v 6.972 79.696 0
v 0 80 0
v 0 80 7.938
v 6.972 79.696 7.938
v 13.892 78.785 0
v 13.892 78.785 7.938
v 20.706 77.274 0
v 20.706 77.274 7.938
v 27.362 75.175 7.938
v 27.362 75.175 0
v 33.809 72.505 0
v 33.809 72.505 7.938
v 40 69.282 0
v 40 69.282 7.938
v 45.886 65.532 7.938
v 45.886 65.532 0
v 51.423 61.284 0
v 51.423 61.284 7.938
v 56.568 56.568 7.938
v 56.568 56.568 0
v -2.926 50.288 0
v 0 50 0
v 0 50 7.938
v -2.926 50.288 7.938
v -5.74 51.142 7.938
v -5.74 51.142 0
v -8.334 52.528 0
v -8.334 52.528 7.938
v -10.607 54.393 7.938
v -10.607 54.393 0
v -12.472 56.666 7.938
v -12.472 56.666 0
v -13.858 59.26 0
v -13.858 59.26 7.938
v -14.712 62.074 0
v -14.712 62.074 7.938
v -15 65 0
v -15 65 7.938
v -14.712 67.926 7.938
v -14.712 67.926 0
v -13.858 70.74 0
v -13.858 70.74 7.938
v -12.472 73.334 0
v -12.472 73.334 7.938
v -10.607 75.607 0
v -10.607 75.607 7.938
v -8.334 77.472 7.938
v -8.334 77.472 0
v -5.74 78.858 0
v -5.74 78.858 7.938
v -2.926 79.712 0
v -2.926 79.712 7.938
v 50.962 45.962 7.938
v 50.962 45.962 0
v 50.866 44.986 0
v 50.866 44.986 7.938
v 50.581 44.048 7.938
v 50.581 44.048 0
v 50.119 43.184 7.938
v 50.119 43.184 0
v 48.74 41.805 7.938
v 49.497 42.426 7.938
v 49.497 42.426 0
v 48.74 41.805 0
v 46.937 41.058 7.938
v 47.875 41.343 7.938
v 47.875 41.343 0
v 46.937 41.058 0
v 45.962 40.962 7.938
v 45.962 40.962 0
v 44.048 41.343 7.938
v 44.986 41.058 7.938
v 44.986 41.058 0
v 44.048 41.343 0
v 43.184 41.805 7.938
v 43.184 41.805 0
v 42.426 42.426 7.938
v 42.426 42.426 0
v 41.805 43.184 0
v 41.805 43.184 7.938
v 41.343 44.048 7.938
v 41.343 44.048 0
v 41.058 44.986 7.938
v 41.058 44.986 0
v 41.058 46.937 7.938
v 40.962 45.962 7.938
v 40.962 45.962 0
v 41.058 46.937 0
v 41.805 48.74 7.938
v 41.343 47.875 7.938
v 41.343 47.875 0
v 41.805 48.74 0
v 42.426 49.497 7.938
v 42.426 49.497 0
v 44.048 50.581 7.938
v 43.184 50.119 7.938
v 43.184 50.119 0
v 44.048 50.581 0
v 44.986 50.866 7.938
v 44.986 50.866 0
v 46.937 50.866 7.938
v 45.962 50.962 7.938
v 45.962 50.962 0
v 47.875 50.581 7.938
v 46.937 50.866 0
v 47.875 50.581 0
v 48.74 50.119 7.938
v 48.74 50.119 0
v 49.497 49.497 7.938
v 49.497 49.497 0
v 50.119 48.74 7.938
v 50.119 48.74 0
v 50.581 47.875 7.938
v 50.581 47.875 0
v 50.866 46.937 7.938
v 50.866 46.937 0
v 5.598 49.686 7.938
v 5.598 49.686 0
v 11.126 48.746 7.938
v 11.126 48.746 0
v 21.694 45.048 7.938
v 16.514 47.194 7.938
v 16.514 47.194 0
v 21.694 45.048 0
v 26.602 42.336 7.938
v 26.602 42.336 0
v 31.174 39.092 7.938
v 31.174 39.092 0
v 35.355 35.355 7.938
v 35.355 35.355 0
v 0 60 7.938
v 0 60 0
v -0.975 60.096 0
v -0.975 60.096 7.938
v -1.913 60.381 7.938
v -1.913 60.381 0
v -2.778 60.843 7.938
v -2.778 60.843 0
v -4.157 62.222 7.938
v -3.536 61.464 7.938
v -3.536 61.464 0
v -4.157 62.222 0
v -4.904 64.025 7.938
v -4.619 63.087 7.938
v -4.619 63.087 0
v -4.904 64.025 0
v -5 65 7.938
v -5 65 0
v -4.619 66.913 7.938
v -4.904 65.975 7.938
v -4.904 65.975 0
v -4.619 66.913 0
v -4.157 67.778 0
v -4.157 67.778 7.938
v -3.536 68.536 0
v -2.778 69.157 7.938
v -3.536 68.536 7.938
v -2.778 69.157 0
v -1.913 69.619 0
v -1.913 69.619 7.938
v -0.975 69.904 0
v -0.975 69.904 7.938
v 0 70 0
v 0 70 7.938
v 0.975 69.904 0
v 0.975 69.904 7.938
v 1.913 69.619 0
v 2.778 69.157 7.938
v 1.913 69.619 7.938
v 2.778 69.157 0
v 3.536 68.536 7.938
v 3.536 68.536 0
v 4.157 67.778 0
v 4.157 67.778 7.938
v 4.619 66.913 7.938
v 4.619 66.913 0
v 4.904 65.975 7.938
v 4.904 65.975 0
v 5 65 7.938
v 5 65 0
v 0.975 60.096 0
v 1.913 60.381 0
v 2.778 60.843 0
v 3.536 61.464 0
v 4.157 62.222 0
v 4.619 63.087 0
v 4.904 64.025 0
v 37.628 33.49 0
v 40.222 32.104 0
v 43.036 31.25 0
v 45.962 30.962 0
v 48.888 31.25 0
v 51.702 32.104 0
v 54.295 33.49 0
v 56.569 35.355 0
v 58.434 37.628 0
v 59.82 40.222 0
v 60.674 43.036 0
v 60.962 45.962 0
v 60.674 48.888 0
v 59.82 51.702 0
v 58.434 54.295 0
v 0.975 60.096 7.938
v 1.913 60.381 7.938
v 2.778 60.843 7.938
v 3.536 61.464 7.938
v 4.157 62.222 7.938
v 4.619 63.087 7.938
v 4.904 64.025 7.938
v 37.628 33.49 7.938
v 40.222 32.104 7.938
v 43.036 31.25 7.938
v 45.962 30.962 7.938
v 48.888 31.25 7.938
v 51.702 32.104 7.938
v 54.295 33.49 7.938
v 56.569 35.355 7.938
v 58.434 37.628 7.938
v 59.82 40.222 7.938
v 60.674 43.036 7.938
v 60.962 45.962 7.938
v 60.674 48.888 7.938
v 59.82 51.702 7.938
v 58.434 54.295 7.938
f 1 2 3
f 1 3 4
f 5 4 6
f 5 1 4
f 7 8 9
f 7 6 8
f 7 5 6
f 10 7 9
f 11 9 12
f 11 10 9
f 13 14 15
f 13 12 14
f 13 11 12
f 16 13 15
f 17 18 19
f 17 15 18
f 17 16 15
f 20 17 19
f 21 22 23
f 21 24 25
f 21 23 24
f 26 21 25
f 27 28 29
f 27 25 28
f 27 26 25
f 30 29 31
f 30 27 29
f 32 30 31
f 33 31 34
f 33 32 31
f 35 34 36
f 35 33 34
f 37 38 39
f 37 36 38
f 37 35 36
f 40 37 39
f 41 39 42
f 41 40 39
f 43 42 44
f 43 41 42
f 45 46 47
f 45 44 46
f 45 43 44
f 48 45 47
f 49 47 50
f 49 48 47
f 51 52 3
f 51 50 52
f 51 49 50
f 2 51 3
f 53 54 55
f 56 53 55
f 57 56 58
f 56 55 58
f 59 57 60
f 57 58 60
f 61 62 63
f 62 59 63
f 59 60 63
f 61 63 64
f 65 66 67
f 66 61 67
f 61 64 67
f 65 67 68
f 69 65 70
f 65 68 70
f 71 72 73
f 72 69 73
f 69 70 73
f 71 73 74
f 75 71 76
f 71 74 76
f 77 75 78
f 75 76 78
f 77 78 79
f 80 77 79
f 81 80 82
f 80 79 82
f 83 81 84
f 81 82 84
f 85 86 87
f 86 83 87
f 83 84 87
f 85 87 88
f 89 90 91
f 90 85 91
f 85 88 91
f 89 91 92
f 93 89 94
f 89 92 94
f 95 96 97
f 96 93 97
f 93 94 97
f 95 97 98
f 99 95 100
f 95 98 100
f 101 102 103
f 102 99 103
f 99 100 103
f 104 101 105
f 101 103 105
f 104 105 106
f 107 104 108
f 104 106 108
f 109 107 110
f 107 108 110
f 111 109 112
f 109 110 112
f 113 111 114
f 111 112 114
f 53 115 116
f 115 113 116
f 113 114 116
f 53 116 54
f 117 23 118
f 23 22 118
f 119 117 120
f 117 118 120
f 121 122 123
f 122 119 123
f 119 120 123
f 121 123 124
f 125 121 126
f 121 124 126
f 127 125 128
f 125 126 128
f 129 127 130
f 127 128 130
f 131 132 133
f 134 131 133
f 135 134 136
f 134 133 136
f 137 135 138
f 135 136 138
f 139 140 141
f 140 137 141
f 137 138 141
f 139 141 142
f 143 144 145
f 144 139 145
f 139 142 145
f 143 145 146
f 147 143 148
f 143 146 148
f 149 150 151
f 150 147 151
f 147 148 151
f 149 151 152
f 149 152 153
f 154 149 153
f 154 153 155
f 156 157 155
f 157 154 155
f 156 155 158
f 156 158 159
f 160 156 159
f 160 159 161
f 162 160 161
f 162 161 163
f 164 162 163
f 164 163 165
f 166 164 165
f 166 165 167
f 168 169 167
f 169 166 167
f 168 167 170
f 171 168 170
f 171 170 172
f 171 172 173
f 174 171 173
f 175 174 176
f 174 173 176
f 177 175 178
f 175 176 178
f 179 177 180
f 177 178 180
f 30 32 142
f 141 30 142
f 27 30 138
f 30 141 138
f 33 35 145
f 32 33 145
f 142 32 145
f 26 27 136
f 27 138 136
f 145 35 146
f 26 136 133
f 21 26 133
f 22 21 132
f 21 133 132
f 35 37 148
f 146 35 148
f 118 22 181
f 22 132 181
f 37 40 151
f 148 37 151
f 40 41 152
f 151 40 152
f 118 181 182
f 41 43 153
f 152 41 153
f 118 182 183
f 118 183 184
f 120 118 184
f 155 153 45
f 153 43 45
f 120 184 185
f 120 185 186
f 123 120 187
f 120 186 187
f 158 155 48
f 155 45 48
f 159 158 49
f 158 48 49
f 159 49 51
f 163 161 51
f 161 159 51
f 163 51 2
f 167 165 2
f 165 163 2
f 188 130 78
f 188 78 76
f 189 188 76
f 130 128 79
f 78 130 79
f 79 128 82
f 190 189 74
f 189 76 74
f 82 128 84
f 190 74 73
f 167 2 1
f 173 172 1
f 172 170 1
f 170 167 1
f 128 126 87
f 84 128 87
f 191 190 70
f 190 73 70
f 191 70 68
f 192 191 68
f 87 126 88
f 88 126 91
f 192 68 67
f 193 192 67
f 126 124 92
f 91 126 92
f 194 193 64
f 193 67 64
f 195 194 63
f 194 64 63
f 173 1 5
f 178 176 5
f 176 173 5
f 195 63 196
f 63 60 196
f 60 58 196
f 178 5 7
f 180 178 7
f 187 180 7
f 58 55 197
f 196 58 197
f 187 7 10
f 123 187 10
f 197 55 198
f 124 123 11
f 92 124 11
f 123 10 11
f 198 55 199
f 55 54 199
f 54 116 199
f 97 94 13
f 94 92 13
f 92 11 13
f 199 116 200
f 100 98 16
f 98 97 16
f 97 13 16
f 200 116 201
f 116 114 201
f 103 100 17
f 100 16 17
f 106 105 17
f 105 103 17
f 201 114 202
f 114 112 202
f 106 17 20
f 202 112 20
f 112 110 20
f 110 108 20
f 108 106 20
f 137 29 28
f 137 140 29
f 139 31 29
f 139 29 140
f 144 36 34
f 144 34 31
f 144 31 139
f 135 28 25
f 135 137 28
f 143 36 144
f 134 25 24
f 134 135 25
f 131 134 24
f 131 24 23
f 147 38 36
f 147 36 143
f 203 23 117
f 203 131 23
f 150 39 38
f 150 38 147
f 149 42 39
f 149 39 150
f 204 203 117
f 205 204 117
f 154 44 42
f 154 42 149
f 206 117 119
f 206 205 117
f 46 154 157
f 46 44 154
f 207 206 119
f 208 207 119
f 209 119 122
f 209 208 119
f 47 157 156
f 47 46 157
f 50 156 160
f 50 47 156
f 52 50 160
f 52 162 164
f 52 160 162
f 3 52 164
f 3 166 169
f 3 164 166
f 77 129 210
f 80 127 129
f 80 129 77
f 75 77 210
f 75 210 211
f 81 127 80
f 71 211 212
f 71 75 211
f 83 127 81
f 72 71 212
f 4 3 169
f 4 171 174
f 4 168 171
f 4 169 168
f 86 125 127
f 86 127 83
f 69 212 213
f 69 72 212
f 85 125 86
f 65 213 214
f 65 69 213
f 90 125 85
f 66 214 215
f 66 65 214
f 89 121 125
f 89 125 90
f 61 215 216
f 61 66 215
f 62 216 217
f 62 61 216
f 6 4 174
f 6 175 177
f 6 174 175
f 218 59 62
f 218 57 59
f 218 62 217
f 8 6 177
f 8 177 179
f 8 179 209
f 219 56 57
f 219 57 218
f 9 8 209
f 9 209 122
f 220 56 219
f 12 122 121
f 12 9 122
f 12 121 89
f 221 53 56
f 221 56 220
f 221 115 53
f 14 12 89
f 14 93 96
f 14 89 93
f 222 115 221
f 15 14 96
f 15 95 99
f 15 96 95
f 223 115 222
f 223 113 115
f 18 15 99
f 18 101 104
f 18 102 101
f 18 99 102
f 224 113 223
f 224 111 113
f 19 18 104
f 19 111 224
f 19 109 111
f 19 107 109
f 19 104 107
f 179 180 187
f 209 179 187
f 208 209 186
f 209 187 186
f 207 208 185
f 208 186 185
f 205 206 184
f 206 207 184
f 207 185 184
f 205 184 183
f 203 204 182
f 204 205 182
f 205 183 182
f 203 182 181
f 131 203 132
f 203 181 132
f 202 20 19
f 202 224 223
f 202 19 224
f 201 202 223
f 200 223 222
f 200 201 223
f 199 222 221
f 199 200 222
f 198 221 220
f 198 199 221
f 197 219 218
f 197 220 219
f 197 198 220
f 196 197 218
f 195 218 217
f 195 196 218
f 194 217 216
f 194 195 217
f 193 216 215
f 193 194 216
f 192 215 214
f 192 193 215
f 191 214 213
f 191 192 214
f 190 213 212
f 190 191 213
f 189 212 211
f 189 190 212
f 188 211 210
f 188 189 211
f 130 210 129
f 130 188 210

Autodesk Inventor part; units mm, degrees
ref_plane "YZ Plane" through (0, 0, 0) normal (1, 0, 0) x (0, 1, 0)
ref_plane "XZ Plane" through (0, 0, 0) normal (0, 1, 0) x (-1, 0, 0)
ref_plane "XY Plane" through (0, 0, 0) normal (0, 0, 1) x (1, 0, 0)
sketch "Sketch1" plane through (0, 0, 0) normal (0, 0, 1) x (1, 0, 0)
  arc A0 (45.9619, 45.9619) -> (0, 65) centre (0, 0) ccw construction
  arc A1 (56.5685, 56.5685) -> (0, 80) centre (0, 0) ccw
  arc A2 (35.3553, 35.3553) -> (0, 50) centre (0, 0) ccw
  arc A3 (35.3553, 35.3553) -> (56.5685, 56.5685) centre (45.9619, 45.9619) ccw
  arc A4 (0, 80) -> (0, 50) centre (0, 65) ccw
  line L0 (0, 65) -> (0, 0)
  line L1 (0, 0) -> (45.9619, 45.9619)
  circle A5 centre (0, 65) radius 5
  circle A6 centre (45.9619, 45.9619) radius 5
  dimension "d0" = 45
  dimension "d1" = 50
  dimension "d2" = 80
  dimension "d3" = 10
  dimension "d4" = 10
extrude "Extrusion1" add sketch "Sketch1" along normal blind 7.9375 contours A3 A2 A4 A1
properties part number "Support" material "Steel, Mild"
